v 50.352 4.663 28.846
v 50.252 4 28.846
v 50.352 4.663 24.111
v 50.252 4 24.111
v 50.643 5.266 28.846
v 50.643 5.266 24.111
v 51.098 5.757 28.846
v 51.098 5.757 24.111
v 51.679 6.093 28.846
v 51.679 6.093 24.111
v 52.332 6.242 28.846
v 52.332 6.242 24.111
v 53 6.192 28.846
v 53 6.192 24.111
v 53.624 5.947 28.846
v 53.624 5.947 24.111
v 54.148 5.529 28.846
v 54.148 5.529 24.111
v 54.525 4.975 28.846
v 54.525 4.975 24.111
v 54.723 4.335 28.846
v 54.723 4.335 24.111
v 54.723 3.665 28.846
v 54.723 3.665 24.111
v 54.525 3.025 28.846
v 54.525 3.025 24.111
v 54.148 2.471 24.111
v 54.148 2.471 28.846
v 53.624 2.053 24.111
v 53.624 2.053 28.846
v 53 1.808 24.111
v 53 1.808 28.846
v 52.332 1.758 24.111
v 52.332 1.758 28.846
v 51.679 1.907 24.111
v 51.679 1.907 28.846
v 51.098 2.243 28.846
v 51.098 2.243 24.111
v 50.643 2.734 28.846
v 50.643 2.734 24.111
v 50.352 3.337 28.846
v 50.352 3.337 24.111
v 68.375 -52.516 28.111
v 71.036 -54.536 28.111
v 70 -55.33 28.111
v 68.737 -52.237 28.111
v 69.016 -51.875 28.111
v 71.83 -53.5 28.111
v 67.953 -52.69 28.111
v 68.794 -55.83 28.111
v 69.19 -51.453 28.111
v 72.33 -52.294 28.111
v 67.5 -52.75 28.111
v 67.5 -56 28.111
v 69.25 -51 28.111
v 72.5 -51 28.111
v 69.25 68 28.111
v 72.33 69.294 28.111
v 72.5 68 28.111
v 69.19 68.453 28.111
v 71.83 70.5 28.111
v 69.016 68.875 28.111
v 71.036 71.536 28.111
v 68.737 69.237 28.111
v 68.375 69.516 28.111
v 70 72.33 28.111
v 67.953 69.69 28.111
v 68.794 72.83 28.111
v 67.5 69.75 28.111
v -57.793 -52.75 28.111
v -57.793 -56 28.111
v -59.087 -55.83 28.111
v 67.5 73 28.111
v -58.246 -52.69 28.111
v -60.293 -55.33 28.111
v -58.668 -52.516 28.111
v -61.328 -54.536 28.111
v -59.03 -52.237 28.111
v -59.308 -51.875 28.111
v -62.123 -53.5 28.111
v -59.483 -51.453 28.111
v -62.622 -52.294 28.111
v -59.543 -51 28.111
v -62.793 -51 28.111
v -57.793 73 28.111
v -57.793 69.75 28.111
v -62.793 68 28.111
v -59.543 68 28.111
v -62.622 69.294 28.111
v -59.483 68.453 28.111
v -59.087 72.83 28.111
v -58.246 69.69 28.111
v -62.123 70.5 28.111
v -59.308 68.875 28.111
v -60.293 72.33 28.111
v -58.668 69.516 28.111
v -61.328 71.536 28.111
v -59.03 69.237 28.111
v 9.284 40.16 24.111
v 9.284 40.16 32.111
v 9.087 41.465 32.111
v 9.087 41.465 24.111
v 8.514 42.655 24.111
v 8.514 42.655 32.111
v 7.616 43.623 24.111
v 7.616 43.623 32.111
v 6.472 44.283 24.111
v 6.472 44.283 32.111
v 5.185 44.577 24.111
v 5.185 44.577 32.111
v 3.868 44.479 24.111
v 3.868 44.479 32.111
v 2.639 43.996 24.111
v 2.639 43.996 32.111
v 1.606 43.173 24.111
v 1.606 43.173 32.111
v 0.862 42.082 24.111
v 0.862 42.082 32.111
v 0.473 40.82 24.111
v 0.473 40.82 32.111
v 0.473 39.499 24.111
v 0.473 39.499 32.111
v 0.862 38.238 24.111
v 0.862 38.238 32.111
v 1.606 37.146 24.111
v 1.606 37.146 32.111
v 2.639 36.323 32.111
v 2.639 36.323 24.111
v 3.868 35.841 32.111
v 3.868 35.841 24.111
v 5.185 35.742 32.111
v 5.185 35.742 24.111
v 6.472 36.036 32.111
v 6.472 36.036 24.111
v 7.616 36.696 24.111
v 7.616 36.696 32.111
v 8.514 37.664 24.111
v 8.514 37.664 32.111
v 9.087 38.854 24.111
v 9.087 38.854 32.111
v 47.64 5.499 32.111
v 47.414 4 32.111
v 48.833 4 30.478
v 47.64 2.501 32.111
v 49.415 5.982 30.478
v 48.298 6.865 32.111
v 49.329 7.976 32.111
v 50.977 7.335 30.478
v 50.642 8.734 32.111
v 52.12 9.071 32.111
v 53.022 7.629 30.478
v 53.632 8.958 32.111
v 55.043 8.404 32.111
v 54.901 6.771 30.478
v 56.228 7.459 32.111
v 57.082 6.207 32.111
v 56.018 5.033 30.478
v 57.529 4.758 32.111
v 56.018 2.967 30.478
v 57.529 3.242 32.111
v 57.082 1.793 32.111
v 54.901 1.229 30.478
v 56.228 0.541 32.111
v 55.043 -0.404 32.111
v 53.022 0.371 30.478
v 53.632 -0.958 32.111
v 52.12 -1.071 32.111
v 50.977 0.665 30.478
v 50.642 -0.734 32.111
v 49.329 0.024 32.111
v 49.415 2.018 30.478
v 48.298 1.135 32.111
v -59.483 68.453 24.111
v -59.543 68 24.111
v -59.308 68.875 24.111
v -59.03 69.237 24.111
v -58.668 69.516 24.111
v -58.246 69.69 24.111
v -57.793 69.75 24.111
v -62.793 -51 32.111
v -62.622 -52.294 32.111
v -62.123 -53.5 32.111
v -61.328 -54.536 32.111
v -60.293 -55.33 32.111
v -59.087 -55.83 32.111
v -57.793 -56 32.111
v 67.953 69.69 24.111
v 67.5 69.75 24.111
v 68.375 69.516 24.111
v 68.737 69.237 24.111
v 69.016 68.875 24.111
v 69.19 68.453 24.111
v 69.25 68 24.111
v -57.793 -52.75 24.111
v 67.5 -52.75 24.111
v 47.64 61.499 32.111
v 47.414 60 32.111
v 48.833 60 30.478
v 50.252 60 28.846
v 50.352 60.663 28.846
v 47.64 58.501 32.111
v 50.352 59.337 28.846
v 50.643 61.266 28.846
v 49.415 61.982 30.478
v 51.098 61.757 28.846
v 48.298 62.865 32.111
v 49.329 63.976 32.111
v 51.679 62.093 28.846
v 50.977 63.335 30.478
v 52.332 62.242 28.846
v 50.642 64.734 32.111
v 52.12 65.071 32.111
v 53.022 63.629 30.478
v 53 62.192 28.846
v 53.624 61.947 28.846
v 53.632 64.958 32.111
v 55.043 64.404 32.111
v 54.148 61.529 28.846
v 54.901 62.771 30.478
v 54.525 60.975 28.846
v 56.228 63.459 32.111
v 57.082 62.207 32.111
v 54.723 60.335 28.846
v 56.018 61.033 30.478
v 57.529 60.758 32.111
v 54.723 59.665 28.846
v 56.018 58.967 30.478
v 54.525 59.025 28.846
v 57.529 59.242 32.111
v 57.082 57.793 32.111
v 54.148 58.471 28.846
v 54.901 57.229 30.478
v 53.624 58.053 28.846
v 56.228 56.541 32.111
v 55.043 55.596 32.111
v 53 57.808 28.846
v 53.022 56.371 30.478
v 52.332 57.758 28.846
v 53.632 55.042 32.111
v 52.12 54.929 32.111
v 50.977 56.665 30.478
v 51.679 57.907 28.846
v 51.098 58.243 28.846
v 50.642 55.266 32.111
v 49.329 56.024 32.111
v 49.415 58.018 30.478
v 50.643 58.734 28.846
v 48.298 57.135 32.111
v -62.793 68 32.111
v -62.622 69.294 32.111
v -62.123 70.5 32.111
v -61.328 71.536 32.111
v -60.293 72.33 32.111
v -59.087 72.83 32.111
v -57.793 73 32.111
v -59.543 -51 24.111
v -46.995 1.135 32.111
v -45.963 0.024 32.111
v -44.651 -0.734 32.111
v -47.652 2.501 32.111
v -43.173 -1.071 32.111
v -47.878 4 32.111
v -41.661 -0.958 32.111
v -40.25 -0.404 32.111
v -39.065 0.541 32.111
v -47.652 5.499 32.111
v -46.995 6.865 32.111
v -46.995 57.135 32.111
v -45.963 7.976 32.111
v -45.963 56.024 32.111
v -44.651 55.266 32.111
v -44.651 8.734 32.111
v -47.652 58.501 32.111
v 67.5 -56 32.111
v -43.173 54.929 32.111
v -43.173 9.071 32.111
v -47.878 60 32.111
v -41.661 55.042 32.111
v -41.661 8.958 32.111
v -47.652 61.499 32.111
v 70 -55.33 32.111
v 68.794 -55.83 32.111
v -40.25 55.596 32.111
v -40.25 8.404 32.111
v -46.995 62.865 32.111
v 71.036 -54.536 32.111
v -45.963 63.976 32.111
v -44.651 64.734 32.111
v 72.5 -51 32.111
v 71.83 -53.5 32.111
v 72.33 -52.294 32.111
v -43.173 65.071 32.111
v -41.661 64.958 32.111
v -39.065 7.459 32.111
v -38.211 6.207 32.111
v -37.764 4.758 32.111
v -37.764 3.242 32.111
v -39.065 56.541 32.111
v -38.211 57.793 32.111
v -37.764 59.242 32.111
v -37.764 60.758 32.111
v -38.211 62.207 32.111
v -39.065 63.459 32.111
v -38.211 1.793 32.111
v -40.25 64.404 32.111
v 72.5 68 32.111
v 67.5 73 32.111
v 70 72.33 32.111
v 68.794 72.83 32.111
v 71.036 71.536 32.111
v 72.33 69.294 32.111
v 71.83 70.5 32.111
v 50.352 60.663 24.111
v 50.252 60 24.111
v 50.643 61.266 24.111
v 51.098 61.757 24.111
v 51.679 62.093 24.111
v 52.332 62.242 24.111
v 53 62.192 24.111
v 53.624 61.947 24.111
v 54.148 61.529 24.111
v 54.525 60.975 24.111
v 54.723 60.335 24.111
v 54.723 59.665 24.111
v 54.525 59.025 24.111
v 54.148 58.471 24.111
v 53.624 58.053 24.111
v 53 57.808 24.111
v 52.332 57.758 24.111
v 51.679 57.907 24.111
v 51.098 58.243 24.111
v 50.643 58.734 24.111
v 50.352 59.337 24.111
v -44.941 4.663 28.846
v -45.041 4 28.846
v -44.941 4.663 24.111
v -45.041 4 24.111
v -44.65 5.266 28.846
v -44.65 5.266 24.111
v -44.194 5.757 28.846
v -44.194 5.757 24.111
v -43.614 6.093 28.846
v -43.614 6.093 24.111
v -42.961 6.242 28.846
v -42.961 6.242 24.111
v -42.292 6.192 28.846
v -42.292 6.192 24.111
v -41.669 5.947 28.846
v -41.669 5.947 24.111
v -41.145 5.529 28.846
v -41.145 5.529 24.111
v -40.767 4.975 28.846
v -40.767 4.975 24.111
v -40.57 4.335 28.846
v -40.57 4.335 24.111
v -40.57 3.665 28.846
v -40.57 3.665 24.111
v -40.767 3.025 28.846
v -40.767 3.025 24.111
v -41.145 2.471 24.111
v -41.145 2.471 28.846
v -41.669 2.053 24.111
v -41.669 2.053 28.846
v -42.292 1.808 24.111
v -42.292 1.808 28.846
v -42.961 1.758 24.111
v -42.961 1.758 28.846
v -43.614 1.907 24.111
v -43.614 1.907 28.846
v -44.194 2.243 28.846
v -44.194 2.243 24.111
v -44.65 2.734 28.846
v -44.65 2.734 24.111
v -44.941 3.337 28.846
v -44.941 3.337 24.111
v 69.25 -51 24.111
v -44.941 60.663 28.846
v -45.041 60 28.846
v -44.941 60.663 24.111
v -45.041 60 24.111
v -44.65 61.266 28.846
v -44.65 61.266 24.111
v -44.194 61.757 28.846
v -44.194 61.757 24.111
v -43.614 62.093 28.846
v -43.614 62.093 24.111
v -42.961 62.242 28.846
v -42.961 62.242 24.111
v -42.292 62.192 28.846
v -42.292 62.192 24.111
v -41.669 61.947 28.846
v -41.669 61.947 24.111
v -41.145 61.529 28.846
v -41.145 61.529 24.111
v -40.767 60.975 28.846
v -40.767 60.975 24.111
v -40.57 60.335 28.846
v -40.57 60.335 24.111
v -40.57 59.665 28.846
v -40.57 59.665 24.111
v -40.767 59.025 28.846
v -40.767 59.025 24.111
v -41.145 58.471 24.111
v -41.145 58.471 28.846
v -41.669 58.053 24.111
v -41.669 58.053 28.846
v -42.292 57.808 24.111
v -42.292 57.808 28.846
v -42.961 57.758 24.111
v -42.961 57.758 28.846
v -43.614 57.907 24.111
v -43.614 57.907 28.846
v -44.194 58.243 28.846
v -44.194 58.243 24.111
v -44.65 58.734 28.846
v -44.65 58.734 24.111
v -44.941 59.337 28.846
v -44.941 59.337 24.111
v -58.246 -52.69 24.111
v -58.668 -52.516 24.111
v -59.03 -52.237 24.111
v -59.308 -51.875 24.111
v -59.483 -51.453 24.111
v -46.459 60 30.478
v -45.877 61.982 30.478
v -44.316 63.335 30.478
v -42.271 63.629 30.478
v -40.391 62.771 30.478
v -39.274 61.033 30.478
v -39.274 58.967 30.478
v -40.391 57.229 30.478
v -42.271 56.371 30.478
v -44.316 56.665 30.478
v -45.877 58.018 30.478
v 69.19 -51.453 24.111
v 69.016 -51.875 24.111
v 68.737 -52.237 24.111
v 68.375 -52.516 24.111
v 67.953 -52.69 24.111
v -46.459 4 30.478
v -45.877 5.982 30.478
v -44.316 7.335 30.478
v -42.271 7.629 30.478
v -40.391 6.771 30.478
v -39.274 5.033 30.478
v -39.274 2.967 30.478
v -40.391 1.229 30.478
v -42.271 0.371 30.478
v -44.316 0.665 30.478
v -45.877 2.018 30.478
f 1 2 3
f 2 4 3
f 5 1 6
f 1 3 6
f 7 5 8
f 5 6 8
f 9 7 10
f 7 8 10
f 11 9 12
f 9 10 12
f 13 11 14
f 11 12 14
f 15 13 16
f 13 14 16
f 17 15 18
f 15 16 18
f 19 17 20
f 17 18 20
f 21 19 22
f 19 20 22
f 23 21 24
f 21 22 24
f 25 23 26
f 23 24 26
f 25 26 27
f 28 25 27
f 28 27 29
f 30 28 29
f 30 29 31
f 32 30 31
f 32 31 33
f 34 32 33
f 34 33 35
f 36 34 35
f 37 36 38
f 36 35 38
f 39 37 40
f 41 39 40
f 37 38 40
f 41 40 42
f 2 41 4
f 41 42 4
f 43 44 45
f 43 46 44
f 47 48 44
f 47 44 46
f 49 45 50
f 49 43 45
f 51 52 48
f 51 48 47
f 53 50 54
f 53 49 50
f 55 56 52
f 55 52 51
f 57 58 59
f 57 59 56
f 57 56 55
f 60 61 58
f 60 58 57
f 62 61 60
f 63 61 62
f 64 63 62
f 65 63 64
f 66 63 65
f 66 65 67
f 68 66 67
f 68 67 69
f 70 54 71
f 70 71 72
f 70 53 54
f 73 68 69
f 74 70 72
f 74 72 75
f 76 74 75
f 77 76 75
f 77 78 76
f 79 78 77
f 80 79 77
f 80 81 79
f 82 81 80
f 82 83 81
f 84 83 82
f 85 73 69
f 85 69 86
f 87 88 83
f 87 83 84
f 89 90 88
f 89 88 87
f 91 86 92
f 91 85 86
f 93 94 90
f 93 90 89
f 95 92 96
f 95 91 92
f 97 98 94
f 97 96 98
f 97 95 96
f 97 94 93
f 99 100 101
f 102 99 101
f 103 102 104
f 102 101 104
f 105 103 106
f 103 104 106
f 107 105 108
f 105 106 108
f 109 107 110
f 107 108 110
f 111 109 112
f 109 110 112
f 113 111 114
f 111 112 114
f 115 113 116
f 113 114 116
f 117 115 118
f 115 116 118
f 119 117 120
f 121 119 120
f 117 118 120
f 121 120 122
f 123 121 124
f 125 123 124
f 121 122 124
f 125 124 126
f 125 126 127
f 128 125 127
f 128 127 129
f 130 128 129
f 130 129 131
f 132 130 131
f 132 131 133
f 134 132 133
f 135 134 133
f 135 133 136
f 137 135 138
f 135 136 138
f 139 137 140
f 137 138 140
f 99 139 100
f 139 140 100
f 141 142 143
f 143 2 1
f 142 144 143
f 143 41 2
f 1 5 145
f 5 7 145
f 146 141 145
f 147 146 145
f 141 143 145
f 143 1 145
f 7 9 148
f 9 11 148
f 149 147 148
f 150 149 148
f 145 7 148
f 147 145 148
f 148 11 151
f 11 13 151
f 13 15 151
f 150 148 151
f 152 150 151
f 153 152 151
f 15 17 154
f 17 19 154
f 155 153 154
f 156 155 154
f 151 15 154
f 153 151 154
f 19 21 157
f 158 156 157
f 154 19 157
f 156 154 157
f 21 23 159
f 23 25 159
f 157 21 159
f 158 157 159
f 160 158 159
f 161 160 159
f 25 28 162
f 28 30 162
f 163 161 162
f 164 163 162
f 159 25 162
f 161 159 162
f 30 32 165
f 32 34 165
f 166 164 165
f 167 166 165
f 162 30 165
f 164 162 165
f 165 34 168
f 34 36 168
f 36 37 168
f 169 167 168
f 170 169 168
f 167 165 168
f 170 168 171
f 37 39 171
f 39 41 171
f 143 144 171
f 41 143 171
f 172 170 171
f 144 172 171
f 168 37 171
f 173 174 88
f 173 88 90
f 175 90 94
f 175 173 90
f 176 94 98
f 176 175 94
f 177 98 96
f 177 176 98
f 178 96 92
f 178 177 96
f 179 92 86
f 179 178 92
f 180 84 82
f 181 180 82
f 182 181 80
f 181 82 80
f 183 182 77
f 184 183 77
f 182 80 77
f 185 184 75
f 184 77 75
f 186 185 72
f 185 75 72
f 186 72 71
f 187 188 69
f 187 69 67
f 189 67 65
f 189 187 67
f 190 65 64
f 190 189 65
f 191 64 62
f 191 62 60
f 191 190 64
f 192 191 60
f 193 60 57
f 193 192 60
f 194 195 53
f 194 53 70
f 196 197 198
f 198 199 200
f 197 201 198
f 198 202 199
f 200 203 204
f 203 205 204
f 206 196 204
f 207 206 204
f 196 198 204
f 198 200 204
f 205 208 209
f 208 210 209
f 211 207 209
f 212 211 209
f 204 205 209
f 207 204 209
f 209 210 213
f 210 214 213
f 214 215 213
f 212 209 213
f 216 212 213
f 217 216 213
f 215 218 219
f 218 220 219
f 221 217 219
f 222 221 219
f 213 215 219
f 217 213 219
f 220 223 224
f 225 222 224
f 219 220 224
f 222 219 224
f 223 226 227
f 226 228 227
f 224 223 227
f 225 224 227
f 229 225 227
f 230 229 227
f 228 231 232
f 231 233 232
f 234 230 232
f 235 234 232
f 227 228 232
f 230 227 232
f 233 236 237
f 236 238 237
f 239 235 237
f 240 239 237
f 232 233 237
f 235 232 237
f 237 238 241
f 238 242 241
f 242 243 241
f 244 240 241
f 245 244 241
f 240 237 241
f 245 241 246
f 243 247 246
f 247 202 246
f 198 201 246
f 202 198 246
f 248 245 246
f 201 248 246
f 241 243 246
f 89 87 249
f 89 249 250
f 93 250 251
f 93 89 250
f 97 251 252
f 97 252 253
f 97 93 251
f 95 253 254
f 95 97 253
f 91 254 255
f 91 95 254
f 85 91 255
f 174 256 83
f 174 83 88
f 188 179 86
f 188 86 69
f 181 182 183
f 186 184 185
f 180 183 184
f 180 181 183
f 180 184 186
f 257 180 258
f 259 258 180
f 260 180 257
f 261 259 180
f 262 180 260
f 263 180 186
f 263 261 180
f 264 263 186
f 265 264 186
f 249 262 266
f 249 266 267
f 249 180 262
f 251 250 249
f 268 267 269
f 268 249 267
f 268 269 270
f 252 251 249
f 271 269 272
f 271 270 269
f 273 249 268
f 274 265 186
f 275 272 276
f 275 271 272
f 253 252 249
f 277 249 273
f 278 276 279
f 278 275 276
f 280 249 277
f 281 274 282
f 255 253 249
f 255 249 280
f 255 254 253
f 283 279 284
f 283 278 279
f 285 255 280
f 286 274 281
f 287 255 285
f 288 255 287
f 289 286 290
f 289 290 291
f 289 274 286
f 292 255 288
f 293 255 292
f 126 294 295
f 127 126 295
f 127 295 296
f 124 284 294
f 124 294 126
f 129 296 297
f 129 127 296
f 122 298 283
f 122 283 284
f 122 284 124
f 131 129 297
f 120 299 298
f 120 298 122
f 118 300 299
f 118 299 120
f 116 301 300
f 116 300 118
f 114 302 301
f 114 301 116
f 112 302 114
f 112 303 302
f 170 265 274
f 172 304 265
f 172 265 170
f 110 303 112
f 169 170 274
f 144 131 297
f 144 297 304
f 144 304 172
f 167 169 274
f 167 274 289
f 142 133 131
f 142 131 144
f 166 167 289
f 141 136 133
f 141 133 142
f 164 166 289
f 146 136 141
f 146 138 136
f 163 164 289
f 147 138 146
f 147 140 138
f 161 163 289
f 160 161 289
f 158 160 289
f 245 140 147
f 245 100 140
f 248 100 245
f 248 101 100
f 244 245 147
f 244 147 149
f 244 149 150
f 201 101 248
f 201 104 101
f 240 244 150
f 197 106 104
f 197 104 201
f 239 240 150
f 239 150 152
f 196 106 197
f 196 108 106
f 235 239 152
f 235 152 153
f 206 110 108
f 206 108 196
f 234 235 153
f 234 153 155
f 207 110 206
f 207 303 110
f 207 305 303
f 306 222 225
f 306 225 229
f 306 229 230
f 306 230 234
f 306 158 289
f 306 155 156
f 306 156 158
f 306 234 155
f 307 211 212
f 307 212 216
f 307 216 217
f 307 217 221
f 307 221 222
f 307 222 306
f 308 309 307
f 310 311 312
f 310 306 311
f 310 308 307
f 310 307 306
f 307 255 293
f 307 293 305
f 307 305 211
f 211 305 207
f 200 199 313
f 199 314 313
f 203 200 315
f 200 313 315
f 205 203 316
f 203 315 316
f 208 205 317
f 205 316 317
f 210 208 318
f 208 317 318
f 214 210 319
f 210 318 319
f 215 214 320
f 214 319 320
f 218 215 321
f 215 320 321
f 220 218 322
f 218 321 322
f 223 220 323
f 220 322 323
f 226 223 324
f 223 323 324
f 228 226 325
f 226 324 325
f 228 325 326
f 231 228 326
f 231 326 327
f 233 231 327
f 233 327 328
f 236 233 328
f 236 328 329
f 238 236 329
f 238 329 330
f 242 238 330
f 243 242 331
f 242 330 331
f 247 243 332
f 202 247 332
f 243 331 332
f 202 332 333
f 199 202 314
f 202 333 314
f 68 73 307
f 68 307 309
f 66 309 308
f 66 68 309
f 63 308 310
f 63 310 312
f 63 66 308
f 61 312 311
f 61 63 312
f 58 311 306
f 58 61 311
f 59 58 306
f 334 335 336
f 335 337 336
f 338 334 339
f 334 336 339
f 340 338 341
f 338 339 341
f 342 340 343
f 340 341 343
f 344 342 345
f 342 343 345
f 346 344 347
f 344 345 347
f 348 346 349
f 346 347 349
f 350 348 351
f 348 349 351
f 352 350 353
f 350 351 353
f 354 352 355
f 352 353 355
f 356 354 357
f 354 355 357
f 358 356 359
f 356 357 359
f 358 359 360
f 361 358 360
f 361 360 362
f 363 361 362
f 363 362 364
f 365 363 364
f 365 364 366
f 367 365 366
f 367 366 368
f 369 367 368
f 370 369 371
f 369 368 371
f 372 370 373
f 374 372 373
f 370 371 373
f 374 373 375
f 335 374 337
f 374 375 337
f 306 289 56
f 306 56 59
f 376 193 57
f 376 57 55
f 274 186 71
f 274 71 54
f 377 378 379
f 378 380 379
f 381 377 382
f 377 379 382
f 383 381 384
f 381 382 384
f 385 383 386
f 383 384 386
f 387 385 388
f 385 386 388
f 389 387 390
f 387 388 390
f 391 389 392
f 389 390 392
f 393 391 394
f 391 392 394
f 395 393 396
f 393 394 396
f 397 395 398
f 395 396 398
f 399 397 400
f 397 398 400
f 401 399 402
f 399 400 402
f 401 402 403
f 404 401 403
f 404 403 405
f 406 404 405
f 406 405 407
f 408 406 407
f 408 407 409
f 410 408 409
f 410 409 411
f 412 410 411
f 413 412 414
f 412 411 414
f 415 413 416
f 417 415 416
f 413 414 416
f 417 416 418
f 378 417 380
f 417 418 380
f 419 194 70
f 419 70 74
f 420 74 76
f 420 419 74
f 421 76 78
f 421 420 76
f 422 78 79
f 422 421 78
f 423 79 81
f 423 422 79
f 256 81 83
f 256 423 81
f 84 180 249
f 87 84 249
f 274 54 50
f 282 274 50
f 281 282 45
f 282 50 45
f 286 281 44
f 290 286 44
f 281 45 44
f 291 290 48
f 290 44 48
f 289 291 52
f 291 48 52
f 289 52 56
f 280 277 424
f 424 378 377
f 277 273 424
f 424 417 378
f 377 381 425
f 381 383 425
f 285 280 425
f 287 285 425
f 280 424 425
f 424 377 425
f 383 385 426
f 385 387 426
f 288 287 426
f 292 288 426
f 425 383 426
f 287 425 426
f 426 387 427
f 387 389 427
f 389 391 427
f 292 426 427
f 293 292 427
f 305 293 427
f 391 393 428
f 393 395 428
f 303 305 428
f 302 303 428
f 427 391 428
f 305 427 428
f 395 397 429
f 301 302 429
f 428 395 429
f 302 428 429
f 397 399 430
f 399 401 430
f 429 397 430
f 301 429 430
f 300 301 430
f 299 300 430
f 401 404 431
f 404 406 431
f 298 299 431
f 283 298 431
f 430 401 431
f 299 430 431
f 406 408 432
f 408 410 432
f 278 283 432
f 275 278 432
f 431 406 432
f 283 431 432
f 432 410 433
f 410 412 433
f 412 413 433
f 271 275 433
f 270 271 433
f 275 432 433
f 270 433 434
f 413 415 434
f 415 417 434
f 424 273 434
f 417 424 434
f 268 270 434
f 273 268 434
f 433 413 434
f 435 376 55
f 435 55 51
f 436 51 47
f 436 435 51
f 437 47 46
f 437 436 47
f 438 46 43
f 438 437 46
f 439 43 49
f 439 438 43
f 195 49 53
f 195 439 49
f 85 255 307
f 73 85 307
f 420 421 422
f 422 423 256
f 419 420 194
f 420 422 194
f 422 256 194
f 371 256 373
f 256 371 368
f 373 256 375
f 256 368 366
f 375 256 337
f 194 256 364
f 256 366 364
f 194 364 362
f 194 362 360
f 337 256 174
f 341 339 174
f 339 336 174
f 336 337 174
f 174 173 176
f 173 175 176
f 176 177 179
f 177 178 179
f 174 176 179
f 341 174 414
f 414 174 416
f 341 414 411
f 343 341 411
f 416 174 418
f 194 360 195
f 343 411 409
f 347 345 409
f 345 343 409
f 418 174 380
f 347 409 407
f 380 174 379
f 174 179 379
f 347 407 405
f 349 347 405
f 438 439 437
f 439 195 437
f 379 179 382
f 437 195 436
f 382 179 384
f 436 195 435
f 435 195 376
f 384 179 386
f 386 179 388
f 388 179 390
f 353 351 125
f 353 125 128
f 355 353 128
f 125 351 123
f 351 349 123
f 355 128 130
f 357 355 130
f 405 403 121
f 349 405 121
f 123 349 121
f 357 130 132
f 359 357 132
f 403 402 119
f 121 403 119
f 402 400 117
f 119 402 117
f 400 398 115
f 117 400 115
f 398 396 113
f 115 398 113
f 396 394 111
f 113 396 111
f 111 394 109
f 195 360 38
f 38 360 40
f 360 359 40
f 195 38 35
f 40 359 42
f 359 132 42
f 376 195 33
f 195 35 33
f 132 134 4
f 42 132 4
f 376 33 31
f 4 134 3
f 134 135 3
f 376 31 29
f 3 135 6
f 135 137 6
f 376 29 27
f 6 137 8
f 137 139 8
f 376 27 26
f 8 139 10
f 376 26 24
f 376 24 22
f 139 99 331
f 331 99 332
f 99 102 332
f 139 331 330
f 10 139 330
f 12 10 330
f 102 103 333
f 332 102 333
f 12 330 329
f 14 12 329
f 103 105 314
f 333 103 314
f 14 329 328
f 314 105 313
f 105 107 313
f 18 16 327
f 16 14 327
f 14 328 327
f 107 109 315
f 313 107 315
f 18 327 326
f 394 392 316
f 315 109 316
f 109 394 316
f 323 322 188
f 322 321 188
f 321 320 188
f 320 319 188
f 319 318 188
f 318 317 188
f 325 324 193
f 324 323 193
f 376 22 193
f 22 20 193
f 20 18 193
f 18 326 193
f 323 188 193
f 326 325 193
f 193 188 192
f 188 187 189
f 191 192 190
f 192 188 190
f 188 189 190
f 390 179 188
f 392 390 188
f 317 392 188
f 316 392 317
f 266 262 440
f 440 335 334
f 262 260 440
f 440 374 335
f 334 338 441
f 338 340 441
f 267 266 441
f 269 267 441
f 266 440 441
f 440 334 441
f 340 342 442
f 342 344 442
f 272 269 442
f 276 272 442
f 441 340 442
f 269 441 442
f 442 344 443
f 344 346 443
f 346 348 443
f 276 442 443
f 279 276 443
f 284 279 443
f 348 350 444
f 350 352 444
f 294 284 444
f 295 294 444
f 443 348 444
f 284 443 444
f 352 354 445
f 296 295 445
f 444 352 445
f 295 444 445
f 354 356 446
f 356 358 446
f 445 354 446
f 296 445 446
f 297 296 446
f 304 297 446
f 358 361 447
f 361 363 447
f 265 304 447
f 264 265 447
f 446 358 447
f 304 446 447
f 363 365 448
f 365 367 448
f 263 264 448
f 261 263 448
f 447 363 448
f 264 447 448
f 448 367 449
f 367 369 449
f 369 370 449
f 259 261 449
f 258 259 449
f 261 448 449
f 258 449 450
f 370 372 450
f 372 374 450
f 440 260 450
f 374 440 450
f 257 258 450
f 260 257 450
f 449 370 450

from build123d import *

# Parameters (mm, degrees)
SKETCH2_W                                      = 115.292618629
SKETCH2_H                                      = 134.000000002
BOSS_EXTRUDE2_DEPTH                            = 8
FILLET2_R                                      = 6
SKETCH19_W                                     = 8
SKETCH19_H                                     = 99
BOSS_EXTRUDE3_DEPTH                            = 115.292618629
SKETCH21_W                                     = 135.292618629
SKETCH21_H                                     = 129
SKETCH21_W_2                                   = 115.292618629
SKETCH21_H_2                                   = 99
BOSS_EXTRUDE4_DEPTH                            = 8
FILLET3_R                                      = 5
CUT_EXTRUDE1_DEPTH                             = 4
SKETCH24_W                                     = 115.292618629
SKETCH24_H                                     = 10
BOSS_EXTRUDE5_DEPTH                            = 104
FILLET4_R                                      = 6
SKETCH49_R                                     = 4.43
CUT_EXTRUDE3_DEPTH                             = 8
M2_5_CLEARANCE_HOLE1_D                         = 2.9
CUT_EXTRUDE4_START                             = -8
CUT_EXTRUDE4_DEPTH                             = 8
CHAMFER1_SIZE                                  = 0.9
CSK_FOR_8_FLAT_HEAD_MACHINE_SCREW1_D           = 4.4958
CSK_FOR_8_FLAT_HEAD_MACHINE_SCREW1_DEPTH       = 8
CSK_FOR_8_FLAT_HEAD_MACHINE_SCREW1_CSINK_D     = 10.1713792
CSK_FOR_8_FLAT_HEAD_MACHINE_SCREW1_CSINK_ANGLE = 82
CSK_FOR_8_FLAT_HEAD_MACHINE_SCREW1_TIP         = 1.350674586
SKETCH61_W                                     = 115.292618629
SKETCH61_H                                     = 134.000000002
CUT_EXTRUDE6_DEPTH                             = 65


with BuildPart() as part:
    # Sketch2 → Boss-Extrude2 (new body)
    with BuildSketch(Plane(origin=(0, 0, 0), x_dir=(1, 0, 0), z_dir=(0, 1, 0))):
        with Locations((4.853690686, 42.889279439)):
            Rectangle(SKETCH2_W, SKETCH2_H)
    extrude(amount=BOSS_EXTRUDE2_DEPTH)

    # Fillet2
    fillet2_edges = [part.edges().sort_by_distance(p)[0] for p in [
        (-52.792618629, 4, -109.88927944),
        (62.5, 4, -109.88927944),
    ]]
    fillet(fillet2_edges, radius=FILLET2_R)

    # Sketch19 → Boss-Extrude3 (add)
    with BuildSketch(Plane.ZY.offset(52.792618629)):
        with Locations((28.110720562, 13.5)):
            Rectangle(SKETCH19_W, SKETCH19_H)
    extrude(amount=-BOSS_EXTRUDE3_DEPTH)

    # Sketch21 → Boss-Extrude4 (add)
    with BuildSketch(Plane.XY.offset(32.110720562)):
        with Locations((4.853690685, 8.5)):
            Rectangle(SKETCH21_W, SKETCH21_H)
        with Locations((4.853690686, 13.5)):
            Rectangle(SKETCH21_W_2, SKETCH21_H_2, mode=Mode.SUBTRACT)
    extrude(amount=-BOSS_EXTRUDE4_DEPTH)

    # Fillet3
    fillet3_edges = [part.edges().sort_by_distance(p)[0] for p in [
        (72.5, 73, 28.110720562),
        (72.5, -56, 28.110720562),
        (-62.792618629, -56, 28.110720562),
        (-62.792618629, 73, 28.110720562),
    ]]
    fillet(fillet3_edges, radius=FILLET3_R)

    # Sketch22 → Cut-Extrude1 (cut)
    with BuildSketch(Plane(origin=(0, 0, 24.110720562), x_dir=(-1, 0, 0), z_dir=(0, 0, -1))):
        with BuildLine():
            Line((62.792618629, -51), (62.792618629, 68))
            ThreePointArc((62.792618629, 68), (61.328152535, 71.535533906), (57.792618629, 73))
            Line((57.792618629, 73), (-67.5, 73))
            ThreePointArc((-67.5, 73), (-71.035533906, 71.535533906), (-72.5, 68))
            Line((-72.5, 68), (-72.5, -51))
            ThreePointArc((-72.5, -51), (-71.035533906, -54.535533906), (-67.5, -56))
            Line((-67.5, -56), (57.792618629, -56))
            ThreePointArc((57.792618629, -56), (61.328152535, -54.535533906), (62.792618629, -51))
        make_face()
        with BuildLine():
            Line((57.792618629, 69.75), (-67.5, 69.75))
            ThreePointArc((-67.5, 69.75), (-68.737436867, 69.237436867), (-69.25, 68))
            Line((-69.25, 68), (-69.25, -51))
            ThreePointArc((-69.25, -51), (-68.737436867, -52.237436867), (-67.5, -52.75))
            Line((-67.5, -52.75), (57.792618629, -52.75))
            ThreePointArc((57.792618629, -52.75), (59.030055496, -52.237436867), (59.542618629, -51))
            Line((59.542618629, -51), (59.542618629, 68))
            ThreePointArc((59.542618629, 68), (59.030055496, 69.237436867), (57.792618629, 69.75))
        make_face(mode=Mode.SUBTRACT)
    extrude(amount=-CUT_EXTRUDE1_DEPTH, mode=Mode.SUBTRACT)

    # Sketch24 → Boss-Extrude5 (add)
    with BuildSketch(Plane(origin=(0, 0, 24.110720562), x_dir=(-1, 0, 0), z_dir=(0, 0, -1))):
        with Locations((-4.853690686, 60)):
            Rectangle(SKETCH24_W, SKETCH24_H)
    extrude(amount=BOSS_EXTRUDE5_DEPTH)

    # Fillet4
    fillet4_edges = [part.edges().sort_by_distance(p)[0] for p in [
        (62.5, 60, -79.889279438),
        (-52.792618629, 60, -79.889279438),
    ]]
    fillet(fillet4_edges, radius=FILLET4_R)

    # Sketch49 → Cut-Extrude3 (cut)
    with BuildSketch(Plane.XY.offset(32.110720562)):
        with Locations((4.853690685, 40.159632183)):
            Circle(SKETCH49_R)
    extrude(amount=-CUT_EXTRUDE3_DEPTH, mode=Mode.SUBTRACT)

    # M2.5 Clearance Hole1 (through all)
    with Locations(Plane(origin=(0, 8, 0), x_dir=(1, 0, 0), z_dir=(0, 1, 0))):
        with Locations((-28.27, 101.64), (-7.29, 101.64), (-7.29, 88.14), (-28.27, 88.14)):
            Hole(M2_5_CLEARANCE_HOLE1_D / 2)

    # Sketch60 → Cut-Extrude4 (cut)
    with BuildSketch(Plane(origin=(0, 8, 0), x_dir=(1, 0, 0), z_dir=(0, 1, 0)).offset(CUT_EXTRUDE4_START)):
        with BuildLine():
            Line((-30.27, 103.09), (-26.27, 103.09))
            ThreePointArc((-26.27, 103.09), (-24.82, 101.64), (-26.27, 100.19))
            Line((-26.27, 100.19), (-30.27, 100.19))
            ThreePointArc((-30.27, 100.19), (-31.72, 101.64), (-30.27, 103.09))
        make_face()
        with BuildLine():
            Line((-9.29, 103.09), (-5.29, 103.09))
            ThreePointArc((-5.29, 103.09), (-3.84, 101.64), (-5.29, 100.19))
            Line((-5.29, 100.19), (-9.29, 100.19))
            ThreePointArc((-9.29, 100.19), (-10.74, 101.64), (-9.29, 103.09))
        make_face()
        with BuildLine():
            Line((-30.27, 89.59), (-26.27, 89.59))
            ThreePointArc((-26.27, 89.59), (-24.82, 88.14), (-26.27, 86.69))
            Line((-26.27, 86.69), (-30.27, 86.69))
            ThreePointArc((-30.27, 86.69), (-31.72, 88.14), (-30.27, 89.59))
        make_face()
        with BuildLine():
            Line((-9.29, 89.59), (-5.29, 89.59))
            ThreePointArc((-5.29, 89.59), (-3.84, 88.14), (-5.29, 86.69))
            Line((-5.29, 86.69), (-9.29, 86.69))
            ThreePointArc((-9.29, 86.69), (-10.74, 88.14), (-9.29, 89.59))
        make_face()
    extrude(amount=CUT_EXTRUDE4_DEPTH, mode=Mode.SUBTRACT)

    # Chamfer1
    chamfer1_edges = [part.edges().sort_by_distance(p)[0] for p in [
        (-7.29, 8, -100.19),
        (-3.84, 8, -101.64),
        (-7.29, 8, -103.09),
        (-28.27, 8, -86.69),
        (-24.82, 8, -88.14),
        (-28.27, 8, -89.59),
        (-7.29, 8, -86.69),
        (-3.84, 8, -88.14),
        (-7.29, 8, -89.59),
        (-28.27, 8, -103.09),
        (-31.72, 8, -101.64),
        (-28.27, 8, -100.19),
        (-24.82, 8, -101.64),
        (-10.74, 8, -88.14),
        (-31.72, 8, -88.14),
        (-10.74, 8, -101.64),
    ]]
    chamfer(chamfer1_edges, length=CHAMFER1_SIZE)

    # CSK for #8 Flat Head Machine Screw1
    with Locations(Plane.XY.offset(32.110720562)):
        with Locations((-42.792618629, 60), (52.5, 60), (-42.792618629, 4), (52.5, 4)):
            CounterSinkHole(CSK_FOR_8_FLAT_HEAD_MACHINE_SCREW1_D / 2, CSK_FOR_8_FLAT_HEAD_MACHINE_SCREW1_CSINK_D / 2, depth=CSK_FOR_8_FLAT_HEAD_MACHINE_SCREW1_DEPTH, counter_sink_angle=CSK_FOR_8_FLAT_HEAD_MACHINE_SCREW1_CSINK_ANGLE)
            with Locations((0, 0, -(CSK_FOR_8_FLAT_HEAD_MACHINE_SCREW1_DEPTH + CSK_FOR_8_FLAT_HEAD_MACHINE_SCREW1_TIP / 2))):  # 118° drill point
                Cone(0, CSK_FOR_8_FLAT_HEAD_MACHINE_SCREW1_D / 2, CSK_FOR_8_FLAT_HEAD_MACHINE_SCREW1_TIP, mode=Mode.SUBTRACT)

    # Sketch61 → Cut-Extrude6 (cut)
    with BuildSketch(Plane(origin=(0, 65, 0), x_dir=(1, 0, 0), z_dir=(0, 1, 0))):
        with Locations((4.853690686, 42.889279439)):
            Rectangle(SKETCH61_W, SKETCH61_H)
    extrude(amount=-CUT_EXTRUDE6_DEPTH, mode=Mode.SUBTRACT)


solid = part.part
